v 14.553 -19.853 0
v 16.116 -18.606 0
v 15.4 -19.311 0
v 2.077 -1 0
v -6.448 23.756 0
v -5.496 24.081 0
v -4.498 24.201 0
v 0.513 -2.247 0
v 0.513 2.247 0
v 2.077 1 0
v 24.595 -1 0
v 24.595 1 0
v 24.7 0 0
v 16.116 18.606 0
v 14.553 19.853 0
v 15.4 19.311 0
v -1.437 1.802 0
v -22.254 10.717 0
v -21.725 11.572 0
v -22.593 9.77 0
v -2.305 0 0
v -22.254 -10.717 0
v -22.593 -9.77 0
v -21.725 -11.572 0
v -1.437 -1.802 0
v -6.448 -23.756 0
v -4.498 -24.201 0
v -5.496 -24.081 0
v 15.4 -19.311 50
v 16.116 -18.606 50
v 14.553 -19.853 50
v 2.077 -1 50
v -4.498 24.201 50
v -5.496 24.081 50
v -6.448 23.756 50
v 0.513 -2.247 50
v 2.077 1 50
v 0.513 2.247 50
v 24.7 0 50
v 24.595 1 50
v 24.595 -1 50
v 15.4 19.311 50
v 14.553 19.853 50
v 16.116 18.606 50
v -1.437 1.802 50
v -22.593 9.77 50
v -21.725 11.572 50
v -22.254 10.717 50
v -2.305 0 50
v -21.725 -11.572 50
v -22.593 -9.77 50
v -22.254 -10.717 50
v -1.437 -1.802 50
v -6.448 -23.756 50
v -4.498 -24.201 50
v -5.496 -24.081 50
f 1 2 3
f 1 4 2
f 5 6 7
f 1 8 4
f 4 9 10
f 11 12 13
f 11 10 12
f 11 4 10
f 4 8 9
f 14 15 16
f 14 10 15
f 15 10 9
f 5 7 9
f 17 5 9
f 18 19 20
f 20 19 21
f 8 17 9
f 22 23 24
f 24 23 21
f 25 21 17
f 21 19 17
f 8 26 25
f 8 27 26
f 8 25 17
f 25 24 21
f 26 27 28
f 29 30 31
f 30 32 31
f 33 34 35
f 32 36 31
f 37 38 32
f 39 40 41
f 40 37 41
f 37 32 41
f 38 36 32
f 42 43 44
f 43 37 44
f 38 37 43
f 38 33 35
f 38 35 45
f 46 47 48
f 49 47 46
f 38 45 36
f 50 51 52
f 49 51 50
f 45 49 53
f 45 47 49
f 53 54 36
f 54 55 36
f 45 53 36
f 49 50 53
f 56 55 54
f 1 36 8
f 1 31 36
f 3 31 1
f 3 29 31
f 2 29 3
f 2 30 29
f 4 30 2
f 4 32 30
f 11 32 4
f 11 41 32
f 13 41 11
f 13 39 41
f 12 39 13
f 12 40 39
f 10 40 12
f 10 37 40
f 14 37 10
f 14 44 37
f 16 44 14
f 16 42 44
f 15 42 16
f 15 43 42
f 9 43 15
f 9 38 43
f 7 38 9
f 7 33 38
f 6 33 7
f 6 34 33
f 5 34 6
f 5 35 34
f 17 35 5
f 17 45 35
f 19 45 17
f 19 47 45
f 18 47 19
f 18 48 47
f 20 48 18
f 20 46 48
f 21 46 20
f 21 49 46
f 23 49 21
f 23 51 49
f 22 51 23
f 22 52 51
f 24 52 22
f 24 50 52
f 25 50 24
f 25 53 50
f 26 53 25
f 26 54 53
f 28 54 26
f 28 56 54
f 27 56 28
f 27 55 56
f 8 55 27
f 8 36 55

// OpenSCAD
//Glass divider
//
//A divider thing to put inside a glass to divide it into segments
//
//Handy if you store things in drinking glasses
//
//Need to know:
// Glass inside diameter
// Clearance between thing and glass
// Number of seqments
// Wall thickness
// Height of thing
// Bottom chamfer required
// Bottom chamfer size
//
Diameter = 50;
Clearance = 0.3;
Segments = 7;
WallThickness = 2;
Height = 50;
ChamferOn = false;
ChamferSize = 10;
//
//Build one leg
module OneLeg()
{
    aDiameter = Diameter - (2 * Clearance);
    intersection()
    {
        circle(d=aDiameter);
        polygon(points = [[0, WallThickness/2], [0, -WallThickness/2], 
                    [Diameter, -WallThickness/2], [Diameter, WallThickness/2]]); 
    }
}
//
//Make a collection of legs
module AllLegs()
{
    for (aLeg=[1:1:Segments])
    {
        aAngle = (aLeg-1) * (360 / Segments);
        rotate (aAngle) OneLeg();
    }
}
//
//Make the chamfer shape
module Chamfer()
{
    //Make the chamfer cross section (yz plane) and rotate it (z axis)
    aRadius = Diameter/2;
    translate([0,0,Height])
    rotate([0,180,0])
    rotate_extrude($fn=360)
    polygon (points = [[aRadius-ChamferSize, -0.1], [aRadius, -0.1],
            [aRadius, ChamferSize]]);
}

//Extrude the legs
module Walls()
{
    linear_extrude(height = Height, center=false)
    AllLegs();
}
//
//Add the Chamfer if required
if (ChamferOn)
{
    difference()
    {
        Walls();
        Chamfer();
    }
}
else
{
    Walls();
}
